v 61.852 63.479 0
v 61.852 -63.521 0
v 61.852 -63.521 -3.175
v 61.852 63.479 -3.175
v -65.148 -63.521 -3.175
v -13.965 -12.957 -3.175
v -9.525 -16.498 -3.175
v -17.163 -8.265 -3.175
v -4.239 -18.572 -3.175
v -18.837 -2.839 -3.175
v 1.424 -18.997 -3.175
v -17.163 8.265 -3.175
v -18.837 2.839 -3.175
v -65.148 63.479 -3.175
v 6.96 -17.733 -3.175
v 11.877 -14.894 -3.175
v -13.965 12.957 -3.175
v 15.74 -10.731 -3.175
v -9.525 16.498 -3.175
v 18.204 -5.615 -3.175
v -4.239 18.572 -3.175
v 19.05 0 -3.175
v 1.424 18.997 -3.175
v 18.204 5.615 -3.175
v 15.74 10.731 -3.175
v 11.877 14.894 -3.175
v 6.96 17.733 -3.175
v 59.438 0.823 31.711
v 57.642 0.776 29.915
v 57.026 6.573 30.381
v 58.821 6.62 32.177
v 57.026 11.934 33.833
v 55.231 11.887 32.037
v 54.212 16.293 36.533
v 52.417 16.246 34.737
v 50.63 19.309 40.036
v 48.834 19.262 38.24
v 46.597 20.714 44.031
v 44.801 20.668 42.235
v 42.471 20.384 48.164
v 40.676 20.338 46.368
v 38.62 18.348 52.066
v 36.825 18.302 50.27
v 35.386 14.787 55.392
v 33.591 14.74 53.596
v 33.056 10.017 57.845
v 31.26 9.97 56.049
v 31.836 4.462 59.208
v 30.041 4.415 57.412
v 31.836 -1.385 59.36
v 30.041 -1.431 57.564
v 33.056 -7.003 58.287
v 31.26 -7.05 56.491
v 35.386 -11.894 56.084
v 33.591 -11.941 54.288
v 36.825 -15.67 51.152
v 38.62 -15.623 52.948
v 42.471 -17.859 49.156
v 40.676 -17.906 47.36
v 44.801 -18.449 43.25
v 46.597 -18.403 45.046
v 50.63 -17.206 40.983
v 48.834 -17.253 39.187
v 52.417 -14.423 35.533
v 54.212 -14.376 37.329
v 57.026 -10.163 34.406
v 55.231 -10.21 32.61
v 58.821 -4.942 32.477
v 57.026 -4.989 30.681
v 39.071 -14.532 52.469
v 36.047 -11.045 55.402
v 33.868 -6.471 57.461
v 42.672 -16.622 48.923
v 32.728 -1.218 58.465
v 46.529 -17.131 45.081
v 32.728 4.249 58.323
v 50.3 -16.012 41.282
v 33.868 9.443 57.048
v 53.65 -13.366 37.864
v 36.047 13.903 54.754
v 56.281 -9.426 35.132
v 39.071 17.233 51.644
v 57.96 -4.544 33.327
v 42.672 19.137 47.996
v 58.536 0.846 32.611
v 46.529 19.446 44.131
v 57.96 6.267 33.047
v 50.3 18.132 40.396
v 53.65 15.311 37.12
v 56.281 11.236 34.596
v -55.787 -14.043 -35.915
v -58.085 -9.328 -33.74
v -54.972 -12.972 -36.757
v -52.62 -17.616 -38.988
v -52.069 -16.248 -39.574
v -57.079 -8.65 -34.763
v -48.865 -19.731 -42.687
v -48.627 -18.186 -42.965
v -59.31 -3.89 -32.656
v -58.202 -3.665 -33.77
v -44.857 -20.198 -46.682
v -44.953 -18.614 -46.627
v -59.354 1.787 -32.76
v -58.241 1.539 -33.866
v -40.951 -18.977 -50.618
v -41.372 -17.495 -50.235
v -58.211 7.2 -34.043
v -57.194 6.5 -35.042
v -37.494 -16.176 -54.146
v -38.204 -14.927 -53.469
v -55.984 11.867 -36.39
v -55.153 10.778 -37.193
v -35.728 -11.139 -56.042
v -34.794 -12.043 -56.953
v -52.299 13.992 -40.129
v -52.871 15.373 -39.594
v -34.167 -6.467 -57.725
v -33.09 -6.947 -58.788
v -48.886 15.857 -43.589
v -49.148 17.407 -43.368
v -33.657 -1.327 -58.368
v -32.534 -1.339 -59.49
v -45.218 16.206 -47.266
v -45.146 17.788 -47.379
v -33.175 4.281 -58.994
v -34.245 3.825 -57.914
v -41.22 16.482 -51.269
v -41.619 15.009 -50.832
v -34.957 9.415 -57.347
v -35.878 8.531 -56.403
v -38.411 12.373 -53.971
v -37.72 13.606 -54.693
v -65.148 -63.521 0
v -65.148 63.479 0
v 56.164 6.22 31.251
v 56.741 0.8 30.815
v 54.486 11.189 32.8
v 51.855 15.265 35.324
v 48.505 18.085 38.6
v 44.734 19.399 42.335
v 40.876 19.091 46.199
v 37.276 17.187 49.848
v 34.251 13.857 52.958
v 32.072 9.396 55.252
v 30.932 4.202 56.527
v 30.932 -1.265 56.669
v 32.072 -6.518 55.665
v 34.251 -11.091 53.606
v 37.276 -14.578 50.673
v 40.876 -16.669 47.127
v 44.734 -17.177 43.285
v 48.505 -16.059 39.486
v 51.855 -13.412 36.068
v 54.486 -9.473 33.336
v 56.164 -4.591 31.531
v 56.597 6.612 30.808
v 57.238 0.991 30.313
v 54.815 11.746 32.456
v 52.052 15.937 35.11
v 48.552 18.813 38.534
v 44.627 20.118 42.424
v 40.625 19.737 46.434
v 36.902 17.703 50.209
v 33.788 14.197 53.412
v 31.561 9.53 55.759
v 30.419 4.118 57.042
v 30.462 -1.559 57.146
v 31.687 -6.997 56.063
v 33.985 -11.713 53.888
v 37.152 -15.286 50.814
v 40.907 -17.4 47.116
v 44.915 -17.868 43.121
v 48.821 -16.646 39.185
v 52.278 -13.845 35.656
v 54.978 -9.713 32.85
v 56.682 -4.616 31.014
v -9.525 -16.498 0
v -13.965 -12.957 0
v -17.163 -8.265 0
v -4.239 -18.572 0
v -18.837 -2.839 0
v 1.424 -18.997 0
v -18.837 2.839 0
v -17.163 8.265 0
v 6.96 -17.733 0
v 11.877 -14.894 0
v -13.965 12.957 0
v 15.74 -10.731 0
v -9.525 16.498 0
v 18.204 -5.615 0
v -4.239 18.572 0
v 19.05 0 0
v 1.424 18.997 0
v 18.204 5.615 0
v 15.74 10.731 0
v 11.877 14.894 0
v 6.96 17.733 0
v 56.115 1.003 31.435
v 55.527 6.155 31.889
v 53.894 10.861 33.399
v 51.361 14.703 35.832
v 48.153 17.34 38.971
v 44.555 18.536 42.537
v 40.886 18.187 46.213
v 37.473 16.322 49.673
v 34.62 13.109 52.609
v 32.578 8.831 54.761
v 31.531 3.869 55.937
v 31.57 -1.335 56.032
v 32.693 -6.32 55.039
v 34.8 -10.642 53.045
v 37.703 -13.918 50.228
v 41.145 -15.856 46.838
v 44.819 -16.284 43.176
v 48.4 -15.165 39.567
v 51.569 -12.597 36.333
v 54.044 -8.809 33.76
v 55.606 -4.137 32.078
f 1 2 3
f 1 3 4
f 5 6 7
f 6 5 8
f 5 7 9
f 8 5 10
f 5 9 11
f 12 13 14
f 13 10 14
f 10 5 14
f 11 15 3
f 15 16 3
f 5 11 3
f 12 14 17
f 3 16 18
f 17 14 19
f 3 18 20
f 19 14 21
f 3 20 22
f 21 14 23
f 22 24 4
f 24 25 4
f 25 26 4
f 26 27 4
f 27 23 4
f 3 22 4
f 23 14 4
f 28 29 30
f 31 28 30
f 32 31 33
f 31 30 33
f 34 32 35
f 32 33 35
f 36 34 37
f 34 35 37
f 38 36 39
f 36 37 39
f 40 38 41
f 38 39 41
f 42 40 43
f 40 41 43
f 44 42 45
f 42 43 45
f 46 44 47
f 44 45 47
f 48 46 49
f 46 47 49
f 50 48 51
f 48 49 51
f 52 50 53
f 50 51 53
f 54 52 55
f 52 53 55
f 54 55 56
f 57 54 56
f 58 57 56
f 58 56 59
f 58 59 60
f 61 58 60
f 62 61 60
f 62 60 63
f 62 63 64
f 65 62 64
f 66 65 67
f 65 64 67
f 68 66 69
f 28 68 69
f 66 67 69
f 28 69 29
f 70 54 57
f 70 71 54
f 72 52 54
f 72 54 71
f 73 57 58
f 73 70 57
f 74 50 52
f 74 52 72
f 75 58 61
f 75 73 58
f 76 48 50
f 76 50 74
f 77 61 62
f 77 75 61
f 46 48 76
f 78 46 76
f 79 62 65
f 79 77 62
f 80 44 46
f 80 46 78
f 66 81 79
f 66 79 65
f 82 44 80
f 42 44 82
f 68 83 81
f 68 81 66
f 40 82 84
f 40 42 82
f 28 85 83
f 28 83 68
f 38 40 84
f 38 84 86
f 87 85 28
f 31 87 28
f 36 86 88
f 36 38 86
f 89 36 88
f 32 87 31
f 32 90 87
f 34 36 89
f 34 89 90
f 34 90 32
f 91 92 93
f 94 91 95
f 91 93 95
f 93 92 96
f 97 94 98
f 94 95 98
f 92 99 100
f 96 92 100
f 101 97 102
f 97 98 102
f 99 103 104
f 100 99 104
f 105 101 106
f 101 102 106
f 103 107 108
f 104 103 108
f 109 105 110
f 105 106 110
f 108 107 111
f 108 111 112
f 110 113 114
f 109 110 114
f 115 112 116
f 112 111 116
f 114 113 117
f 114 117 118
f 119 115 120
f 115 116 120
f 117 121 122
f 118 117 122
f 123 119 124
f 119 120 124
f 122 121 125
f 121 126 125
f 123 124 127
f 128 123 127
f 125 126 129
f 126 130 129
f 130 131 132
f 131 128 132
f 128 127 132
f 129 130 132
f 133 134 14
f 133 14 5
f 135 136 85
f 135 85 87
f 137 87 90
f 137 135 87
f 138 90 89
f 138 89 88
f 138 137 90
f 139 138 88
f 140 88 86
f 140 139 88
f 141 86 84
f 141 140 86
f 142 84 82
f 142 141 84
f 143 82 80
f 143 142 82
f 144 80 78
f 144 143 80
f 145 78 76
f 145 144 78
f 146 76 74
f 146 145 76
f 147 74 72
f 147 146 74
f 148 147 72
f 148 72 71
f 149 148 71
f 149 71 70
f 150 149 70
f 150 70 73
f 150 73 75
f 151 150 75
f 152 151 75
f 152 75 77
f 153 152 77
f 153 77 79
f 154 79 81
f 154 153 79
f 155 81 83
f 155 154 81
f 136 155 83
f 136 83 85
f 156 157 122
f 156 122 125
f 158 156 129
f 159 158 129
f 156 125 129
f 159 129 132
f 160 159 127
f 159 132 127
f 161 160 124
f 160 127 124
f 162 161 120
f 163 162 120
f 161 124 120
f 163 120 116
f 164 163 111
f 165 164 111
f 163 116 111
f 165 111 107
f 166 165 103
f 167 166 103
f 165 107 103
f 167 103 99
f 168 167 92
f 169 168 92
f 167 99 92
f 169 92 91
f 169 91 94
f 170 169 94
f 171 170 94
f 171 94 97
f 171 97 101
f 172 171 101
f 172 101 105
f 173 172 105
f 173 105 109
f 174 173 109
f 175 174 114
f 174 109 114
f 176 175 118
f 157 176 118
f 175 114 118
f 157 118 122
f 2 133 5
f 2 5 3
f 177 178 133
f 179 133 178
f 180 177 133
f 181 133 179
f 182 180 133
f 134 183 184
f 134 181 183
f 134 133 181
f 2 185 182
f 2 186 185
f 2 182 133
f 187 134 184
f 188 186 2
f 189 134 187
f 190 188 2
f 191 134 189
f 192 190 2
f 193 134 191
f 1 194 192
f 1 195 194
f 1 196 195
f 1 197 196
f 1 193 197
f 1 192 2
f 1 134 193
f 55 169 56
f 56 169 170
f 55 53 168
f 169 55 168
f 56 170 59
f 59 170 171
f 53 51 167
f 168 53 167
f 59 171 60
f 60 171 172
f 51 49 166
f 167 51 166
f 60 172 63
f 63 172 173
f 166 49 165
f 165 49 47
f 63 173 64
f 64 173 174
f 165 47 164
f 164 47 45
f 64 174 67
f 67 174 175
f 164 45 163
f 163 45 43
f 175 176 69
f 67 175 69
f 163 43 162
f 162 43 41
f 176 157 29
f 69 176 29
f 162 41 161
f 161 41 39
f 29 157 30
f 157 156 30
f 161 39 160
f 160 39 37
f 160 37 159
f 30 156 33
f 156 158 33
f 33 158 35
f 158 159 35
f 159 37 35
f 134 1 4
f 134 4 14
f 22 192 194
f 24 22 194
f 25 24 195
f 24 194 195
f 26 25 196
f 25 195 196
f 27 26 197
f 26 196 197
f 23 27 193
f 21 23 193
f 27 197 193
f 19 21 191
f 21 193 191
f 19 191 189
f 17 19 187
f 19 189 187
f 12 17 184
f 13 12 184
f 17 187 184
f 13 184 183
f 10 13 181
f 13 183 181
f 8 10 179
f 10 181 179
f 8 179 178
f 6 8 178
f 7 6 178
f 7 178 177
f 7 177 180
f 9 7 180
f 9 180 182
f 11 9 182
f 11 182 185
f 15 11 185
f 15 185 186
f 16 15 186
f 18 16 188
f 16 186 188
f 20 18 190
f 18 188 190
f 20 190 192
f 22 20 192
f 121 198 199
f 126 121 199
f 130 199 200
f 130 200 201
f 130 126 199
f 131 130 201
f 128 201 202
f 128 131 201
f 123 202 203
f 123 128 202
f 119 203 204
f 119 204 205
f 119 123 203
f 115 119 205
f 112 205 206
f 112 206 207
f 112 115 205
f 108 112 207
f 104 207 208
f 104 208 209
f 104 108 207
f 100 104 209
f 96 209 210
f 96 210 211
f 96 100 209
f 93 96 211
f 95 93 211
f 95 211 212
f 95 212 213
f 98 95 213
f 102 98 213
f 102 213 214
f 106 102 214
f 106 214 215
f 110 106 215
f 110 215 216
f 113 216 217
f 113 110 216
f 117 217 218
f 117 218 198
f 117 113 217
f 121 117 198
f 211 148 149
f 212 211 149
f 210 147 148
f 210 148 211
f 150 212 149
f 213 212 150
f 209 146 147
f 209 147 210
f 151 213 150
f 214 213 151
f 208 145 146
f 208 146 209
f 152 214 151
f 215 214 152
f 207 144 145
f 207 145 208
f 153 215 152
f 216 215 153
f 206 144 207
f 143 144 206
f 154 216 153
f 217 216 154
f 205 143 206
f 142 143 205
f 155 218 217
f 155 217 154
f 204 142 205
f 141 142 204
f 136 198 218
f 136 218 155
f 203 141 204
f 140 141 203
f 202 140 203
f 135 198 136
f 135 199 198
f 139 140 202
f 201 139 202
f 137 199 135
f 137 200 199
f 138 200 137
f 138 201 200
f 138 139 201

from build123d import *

# Parameters (mm, degrees)
F0_R     = 19.05
F0_R_2   = 17.4625
F1_DEPTH = 127
F2_DEPTH = 3.175
F4_ANGLE = 45
F5_R     = 19.6200089016
F5_R_2   = 19.05
F5_R_3   = 18.3457518045
F6_DEPTH = 2.54


with BuildPart() as f1:
    # F0 (on Top) → F1 (new body)
    with BuildSketch(Plane.XY):
        Circle(F0_R)
        Circle(F0_R_2, mode=Mode.SUBTRACT)
    extrude(amount=F1_DEPTH)


with BuildPart() as f2:
    # F0 (on Top) → F2 (new body)
    with BuildSketch(Plane.XY):
        Polygon((61.8521502989, 63.4786152288), (-1.6478497011, 63.4786152288), (-65.1478497011, 63.4786152288), (-65.1478497011, -63.5213847712), (61.8521502989, -63.5213847712), align=None)
        Circle(F0_R, mode=Mode.SUBTRACT)
    extrude(amount=-F2_DEPTH)


with BuildPart() as f1_1:
    # F3: moved
    add(f1.part.moved(Location((0, 0, -65.0875))))


with BuildPart() as f1_2:
    # F4: moved
    add(f1_1.part.rotate(Axis((-0.8239248506, 31.7393076144, 0), (-0.025950389, 0.9996632319, 0)), F4_ANGLE))

    # F5 (on face) → F6 (join)
    with BuildSketch(Plane(origin=(43.7640053064, 1.1360755556, 43.7787485902), x_dir=(0.707344832, -0.0183373431, -0.7066307597), z_dir=(0.7068686502, 0.018349696, 0.7071067812))):
        Circle(F5_R)
        Circle(F5_R_2, mode=Mode.SUBTRACT)
        Circle(F5_R_2)
        Circle(F5_R_3, mode=Mode.SUBTRACT)
    extrude(amount=F6_DEPTH)


solid = Compound([f2.part, f1_2.part])
